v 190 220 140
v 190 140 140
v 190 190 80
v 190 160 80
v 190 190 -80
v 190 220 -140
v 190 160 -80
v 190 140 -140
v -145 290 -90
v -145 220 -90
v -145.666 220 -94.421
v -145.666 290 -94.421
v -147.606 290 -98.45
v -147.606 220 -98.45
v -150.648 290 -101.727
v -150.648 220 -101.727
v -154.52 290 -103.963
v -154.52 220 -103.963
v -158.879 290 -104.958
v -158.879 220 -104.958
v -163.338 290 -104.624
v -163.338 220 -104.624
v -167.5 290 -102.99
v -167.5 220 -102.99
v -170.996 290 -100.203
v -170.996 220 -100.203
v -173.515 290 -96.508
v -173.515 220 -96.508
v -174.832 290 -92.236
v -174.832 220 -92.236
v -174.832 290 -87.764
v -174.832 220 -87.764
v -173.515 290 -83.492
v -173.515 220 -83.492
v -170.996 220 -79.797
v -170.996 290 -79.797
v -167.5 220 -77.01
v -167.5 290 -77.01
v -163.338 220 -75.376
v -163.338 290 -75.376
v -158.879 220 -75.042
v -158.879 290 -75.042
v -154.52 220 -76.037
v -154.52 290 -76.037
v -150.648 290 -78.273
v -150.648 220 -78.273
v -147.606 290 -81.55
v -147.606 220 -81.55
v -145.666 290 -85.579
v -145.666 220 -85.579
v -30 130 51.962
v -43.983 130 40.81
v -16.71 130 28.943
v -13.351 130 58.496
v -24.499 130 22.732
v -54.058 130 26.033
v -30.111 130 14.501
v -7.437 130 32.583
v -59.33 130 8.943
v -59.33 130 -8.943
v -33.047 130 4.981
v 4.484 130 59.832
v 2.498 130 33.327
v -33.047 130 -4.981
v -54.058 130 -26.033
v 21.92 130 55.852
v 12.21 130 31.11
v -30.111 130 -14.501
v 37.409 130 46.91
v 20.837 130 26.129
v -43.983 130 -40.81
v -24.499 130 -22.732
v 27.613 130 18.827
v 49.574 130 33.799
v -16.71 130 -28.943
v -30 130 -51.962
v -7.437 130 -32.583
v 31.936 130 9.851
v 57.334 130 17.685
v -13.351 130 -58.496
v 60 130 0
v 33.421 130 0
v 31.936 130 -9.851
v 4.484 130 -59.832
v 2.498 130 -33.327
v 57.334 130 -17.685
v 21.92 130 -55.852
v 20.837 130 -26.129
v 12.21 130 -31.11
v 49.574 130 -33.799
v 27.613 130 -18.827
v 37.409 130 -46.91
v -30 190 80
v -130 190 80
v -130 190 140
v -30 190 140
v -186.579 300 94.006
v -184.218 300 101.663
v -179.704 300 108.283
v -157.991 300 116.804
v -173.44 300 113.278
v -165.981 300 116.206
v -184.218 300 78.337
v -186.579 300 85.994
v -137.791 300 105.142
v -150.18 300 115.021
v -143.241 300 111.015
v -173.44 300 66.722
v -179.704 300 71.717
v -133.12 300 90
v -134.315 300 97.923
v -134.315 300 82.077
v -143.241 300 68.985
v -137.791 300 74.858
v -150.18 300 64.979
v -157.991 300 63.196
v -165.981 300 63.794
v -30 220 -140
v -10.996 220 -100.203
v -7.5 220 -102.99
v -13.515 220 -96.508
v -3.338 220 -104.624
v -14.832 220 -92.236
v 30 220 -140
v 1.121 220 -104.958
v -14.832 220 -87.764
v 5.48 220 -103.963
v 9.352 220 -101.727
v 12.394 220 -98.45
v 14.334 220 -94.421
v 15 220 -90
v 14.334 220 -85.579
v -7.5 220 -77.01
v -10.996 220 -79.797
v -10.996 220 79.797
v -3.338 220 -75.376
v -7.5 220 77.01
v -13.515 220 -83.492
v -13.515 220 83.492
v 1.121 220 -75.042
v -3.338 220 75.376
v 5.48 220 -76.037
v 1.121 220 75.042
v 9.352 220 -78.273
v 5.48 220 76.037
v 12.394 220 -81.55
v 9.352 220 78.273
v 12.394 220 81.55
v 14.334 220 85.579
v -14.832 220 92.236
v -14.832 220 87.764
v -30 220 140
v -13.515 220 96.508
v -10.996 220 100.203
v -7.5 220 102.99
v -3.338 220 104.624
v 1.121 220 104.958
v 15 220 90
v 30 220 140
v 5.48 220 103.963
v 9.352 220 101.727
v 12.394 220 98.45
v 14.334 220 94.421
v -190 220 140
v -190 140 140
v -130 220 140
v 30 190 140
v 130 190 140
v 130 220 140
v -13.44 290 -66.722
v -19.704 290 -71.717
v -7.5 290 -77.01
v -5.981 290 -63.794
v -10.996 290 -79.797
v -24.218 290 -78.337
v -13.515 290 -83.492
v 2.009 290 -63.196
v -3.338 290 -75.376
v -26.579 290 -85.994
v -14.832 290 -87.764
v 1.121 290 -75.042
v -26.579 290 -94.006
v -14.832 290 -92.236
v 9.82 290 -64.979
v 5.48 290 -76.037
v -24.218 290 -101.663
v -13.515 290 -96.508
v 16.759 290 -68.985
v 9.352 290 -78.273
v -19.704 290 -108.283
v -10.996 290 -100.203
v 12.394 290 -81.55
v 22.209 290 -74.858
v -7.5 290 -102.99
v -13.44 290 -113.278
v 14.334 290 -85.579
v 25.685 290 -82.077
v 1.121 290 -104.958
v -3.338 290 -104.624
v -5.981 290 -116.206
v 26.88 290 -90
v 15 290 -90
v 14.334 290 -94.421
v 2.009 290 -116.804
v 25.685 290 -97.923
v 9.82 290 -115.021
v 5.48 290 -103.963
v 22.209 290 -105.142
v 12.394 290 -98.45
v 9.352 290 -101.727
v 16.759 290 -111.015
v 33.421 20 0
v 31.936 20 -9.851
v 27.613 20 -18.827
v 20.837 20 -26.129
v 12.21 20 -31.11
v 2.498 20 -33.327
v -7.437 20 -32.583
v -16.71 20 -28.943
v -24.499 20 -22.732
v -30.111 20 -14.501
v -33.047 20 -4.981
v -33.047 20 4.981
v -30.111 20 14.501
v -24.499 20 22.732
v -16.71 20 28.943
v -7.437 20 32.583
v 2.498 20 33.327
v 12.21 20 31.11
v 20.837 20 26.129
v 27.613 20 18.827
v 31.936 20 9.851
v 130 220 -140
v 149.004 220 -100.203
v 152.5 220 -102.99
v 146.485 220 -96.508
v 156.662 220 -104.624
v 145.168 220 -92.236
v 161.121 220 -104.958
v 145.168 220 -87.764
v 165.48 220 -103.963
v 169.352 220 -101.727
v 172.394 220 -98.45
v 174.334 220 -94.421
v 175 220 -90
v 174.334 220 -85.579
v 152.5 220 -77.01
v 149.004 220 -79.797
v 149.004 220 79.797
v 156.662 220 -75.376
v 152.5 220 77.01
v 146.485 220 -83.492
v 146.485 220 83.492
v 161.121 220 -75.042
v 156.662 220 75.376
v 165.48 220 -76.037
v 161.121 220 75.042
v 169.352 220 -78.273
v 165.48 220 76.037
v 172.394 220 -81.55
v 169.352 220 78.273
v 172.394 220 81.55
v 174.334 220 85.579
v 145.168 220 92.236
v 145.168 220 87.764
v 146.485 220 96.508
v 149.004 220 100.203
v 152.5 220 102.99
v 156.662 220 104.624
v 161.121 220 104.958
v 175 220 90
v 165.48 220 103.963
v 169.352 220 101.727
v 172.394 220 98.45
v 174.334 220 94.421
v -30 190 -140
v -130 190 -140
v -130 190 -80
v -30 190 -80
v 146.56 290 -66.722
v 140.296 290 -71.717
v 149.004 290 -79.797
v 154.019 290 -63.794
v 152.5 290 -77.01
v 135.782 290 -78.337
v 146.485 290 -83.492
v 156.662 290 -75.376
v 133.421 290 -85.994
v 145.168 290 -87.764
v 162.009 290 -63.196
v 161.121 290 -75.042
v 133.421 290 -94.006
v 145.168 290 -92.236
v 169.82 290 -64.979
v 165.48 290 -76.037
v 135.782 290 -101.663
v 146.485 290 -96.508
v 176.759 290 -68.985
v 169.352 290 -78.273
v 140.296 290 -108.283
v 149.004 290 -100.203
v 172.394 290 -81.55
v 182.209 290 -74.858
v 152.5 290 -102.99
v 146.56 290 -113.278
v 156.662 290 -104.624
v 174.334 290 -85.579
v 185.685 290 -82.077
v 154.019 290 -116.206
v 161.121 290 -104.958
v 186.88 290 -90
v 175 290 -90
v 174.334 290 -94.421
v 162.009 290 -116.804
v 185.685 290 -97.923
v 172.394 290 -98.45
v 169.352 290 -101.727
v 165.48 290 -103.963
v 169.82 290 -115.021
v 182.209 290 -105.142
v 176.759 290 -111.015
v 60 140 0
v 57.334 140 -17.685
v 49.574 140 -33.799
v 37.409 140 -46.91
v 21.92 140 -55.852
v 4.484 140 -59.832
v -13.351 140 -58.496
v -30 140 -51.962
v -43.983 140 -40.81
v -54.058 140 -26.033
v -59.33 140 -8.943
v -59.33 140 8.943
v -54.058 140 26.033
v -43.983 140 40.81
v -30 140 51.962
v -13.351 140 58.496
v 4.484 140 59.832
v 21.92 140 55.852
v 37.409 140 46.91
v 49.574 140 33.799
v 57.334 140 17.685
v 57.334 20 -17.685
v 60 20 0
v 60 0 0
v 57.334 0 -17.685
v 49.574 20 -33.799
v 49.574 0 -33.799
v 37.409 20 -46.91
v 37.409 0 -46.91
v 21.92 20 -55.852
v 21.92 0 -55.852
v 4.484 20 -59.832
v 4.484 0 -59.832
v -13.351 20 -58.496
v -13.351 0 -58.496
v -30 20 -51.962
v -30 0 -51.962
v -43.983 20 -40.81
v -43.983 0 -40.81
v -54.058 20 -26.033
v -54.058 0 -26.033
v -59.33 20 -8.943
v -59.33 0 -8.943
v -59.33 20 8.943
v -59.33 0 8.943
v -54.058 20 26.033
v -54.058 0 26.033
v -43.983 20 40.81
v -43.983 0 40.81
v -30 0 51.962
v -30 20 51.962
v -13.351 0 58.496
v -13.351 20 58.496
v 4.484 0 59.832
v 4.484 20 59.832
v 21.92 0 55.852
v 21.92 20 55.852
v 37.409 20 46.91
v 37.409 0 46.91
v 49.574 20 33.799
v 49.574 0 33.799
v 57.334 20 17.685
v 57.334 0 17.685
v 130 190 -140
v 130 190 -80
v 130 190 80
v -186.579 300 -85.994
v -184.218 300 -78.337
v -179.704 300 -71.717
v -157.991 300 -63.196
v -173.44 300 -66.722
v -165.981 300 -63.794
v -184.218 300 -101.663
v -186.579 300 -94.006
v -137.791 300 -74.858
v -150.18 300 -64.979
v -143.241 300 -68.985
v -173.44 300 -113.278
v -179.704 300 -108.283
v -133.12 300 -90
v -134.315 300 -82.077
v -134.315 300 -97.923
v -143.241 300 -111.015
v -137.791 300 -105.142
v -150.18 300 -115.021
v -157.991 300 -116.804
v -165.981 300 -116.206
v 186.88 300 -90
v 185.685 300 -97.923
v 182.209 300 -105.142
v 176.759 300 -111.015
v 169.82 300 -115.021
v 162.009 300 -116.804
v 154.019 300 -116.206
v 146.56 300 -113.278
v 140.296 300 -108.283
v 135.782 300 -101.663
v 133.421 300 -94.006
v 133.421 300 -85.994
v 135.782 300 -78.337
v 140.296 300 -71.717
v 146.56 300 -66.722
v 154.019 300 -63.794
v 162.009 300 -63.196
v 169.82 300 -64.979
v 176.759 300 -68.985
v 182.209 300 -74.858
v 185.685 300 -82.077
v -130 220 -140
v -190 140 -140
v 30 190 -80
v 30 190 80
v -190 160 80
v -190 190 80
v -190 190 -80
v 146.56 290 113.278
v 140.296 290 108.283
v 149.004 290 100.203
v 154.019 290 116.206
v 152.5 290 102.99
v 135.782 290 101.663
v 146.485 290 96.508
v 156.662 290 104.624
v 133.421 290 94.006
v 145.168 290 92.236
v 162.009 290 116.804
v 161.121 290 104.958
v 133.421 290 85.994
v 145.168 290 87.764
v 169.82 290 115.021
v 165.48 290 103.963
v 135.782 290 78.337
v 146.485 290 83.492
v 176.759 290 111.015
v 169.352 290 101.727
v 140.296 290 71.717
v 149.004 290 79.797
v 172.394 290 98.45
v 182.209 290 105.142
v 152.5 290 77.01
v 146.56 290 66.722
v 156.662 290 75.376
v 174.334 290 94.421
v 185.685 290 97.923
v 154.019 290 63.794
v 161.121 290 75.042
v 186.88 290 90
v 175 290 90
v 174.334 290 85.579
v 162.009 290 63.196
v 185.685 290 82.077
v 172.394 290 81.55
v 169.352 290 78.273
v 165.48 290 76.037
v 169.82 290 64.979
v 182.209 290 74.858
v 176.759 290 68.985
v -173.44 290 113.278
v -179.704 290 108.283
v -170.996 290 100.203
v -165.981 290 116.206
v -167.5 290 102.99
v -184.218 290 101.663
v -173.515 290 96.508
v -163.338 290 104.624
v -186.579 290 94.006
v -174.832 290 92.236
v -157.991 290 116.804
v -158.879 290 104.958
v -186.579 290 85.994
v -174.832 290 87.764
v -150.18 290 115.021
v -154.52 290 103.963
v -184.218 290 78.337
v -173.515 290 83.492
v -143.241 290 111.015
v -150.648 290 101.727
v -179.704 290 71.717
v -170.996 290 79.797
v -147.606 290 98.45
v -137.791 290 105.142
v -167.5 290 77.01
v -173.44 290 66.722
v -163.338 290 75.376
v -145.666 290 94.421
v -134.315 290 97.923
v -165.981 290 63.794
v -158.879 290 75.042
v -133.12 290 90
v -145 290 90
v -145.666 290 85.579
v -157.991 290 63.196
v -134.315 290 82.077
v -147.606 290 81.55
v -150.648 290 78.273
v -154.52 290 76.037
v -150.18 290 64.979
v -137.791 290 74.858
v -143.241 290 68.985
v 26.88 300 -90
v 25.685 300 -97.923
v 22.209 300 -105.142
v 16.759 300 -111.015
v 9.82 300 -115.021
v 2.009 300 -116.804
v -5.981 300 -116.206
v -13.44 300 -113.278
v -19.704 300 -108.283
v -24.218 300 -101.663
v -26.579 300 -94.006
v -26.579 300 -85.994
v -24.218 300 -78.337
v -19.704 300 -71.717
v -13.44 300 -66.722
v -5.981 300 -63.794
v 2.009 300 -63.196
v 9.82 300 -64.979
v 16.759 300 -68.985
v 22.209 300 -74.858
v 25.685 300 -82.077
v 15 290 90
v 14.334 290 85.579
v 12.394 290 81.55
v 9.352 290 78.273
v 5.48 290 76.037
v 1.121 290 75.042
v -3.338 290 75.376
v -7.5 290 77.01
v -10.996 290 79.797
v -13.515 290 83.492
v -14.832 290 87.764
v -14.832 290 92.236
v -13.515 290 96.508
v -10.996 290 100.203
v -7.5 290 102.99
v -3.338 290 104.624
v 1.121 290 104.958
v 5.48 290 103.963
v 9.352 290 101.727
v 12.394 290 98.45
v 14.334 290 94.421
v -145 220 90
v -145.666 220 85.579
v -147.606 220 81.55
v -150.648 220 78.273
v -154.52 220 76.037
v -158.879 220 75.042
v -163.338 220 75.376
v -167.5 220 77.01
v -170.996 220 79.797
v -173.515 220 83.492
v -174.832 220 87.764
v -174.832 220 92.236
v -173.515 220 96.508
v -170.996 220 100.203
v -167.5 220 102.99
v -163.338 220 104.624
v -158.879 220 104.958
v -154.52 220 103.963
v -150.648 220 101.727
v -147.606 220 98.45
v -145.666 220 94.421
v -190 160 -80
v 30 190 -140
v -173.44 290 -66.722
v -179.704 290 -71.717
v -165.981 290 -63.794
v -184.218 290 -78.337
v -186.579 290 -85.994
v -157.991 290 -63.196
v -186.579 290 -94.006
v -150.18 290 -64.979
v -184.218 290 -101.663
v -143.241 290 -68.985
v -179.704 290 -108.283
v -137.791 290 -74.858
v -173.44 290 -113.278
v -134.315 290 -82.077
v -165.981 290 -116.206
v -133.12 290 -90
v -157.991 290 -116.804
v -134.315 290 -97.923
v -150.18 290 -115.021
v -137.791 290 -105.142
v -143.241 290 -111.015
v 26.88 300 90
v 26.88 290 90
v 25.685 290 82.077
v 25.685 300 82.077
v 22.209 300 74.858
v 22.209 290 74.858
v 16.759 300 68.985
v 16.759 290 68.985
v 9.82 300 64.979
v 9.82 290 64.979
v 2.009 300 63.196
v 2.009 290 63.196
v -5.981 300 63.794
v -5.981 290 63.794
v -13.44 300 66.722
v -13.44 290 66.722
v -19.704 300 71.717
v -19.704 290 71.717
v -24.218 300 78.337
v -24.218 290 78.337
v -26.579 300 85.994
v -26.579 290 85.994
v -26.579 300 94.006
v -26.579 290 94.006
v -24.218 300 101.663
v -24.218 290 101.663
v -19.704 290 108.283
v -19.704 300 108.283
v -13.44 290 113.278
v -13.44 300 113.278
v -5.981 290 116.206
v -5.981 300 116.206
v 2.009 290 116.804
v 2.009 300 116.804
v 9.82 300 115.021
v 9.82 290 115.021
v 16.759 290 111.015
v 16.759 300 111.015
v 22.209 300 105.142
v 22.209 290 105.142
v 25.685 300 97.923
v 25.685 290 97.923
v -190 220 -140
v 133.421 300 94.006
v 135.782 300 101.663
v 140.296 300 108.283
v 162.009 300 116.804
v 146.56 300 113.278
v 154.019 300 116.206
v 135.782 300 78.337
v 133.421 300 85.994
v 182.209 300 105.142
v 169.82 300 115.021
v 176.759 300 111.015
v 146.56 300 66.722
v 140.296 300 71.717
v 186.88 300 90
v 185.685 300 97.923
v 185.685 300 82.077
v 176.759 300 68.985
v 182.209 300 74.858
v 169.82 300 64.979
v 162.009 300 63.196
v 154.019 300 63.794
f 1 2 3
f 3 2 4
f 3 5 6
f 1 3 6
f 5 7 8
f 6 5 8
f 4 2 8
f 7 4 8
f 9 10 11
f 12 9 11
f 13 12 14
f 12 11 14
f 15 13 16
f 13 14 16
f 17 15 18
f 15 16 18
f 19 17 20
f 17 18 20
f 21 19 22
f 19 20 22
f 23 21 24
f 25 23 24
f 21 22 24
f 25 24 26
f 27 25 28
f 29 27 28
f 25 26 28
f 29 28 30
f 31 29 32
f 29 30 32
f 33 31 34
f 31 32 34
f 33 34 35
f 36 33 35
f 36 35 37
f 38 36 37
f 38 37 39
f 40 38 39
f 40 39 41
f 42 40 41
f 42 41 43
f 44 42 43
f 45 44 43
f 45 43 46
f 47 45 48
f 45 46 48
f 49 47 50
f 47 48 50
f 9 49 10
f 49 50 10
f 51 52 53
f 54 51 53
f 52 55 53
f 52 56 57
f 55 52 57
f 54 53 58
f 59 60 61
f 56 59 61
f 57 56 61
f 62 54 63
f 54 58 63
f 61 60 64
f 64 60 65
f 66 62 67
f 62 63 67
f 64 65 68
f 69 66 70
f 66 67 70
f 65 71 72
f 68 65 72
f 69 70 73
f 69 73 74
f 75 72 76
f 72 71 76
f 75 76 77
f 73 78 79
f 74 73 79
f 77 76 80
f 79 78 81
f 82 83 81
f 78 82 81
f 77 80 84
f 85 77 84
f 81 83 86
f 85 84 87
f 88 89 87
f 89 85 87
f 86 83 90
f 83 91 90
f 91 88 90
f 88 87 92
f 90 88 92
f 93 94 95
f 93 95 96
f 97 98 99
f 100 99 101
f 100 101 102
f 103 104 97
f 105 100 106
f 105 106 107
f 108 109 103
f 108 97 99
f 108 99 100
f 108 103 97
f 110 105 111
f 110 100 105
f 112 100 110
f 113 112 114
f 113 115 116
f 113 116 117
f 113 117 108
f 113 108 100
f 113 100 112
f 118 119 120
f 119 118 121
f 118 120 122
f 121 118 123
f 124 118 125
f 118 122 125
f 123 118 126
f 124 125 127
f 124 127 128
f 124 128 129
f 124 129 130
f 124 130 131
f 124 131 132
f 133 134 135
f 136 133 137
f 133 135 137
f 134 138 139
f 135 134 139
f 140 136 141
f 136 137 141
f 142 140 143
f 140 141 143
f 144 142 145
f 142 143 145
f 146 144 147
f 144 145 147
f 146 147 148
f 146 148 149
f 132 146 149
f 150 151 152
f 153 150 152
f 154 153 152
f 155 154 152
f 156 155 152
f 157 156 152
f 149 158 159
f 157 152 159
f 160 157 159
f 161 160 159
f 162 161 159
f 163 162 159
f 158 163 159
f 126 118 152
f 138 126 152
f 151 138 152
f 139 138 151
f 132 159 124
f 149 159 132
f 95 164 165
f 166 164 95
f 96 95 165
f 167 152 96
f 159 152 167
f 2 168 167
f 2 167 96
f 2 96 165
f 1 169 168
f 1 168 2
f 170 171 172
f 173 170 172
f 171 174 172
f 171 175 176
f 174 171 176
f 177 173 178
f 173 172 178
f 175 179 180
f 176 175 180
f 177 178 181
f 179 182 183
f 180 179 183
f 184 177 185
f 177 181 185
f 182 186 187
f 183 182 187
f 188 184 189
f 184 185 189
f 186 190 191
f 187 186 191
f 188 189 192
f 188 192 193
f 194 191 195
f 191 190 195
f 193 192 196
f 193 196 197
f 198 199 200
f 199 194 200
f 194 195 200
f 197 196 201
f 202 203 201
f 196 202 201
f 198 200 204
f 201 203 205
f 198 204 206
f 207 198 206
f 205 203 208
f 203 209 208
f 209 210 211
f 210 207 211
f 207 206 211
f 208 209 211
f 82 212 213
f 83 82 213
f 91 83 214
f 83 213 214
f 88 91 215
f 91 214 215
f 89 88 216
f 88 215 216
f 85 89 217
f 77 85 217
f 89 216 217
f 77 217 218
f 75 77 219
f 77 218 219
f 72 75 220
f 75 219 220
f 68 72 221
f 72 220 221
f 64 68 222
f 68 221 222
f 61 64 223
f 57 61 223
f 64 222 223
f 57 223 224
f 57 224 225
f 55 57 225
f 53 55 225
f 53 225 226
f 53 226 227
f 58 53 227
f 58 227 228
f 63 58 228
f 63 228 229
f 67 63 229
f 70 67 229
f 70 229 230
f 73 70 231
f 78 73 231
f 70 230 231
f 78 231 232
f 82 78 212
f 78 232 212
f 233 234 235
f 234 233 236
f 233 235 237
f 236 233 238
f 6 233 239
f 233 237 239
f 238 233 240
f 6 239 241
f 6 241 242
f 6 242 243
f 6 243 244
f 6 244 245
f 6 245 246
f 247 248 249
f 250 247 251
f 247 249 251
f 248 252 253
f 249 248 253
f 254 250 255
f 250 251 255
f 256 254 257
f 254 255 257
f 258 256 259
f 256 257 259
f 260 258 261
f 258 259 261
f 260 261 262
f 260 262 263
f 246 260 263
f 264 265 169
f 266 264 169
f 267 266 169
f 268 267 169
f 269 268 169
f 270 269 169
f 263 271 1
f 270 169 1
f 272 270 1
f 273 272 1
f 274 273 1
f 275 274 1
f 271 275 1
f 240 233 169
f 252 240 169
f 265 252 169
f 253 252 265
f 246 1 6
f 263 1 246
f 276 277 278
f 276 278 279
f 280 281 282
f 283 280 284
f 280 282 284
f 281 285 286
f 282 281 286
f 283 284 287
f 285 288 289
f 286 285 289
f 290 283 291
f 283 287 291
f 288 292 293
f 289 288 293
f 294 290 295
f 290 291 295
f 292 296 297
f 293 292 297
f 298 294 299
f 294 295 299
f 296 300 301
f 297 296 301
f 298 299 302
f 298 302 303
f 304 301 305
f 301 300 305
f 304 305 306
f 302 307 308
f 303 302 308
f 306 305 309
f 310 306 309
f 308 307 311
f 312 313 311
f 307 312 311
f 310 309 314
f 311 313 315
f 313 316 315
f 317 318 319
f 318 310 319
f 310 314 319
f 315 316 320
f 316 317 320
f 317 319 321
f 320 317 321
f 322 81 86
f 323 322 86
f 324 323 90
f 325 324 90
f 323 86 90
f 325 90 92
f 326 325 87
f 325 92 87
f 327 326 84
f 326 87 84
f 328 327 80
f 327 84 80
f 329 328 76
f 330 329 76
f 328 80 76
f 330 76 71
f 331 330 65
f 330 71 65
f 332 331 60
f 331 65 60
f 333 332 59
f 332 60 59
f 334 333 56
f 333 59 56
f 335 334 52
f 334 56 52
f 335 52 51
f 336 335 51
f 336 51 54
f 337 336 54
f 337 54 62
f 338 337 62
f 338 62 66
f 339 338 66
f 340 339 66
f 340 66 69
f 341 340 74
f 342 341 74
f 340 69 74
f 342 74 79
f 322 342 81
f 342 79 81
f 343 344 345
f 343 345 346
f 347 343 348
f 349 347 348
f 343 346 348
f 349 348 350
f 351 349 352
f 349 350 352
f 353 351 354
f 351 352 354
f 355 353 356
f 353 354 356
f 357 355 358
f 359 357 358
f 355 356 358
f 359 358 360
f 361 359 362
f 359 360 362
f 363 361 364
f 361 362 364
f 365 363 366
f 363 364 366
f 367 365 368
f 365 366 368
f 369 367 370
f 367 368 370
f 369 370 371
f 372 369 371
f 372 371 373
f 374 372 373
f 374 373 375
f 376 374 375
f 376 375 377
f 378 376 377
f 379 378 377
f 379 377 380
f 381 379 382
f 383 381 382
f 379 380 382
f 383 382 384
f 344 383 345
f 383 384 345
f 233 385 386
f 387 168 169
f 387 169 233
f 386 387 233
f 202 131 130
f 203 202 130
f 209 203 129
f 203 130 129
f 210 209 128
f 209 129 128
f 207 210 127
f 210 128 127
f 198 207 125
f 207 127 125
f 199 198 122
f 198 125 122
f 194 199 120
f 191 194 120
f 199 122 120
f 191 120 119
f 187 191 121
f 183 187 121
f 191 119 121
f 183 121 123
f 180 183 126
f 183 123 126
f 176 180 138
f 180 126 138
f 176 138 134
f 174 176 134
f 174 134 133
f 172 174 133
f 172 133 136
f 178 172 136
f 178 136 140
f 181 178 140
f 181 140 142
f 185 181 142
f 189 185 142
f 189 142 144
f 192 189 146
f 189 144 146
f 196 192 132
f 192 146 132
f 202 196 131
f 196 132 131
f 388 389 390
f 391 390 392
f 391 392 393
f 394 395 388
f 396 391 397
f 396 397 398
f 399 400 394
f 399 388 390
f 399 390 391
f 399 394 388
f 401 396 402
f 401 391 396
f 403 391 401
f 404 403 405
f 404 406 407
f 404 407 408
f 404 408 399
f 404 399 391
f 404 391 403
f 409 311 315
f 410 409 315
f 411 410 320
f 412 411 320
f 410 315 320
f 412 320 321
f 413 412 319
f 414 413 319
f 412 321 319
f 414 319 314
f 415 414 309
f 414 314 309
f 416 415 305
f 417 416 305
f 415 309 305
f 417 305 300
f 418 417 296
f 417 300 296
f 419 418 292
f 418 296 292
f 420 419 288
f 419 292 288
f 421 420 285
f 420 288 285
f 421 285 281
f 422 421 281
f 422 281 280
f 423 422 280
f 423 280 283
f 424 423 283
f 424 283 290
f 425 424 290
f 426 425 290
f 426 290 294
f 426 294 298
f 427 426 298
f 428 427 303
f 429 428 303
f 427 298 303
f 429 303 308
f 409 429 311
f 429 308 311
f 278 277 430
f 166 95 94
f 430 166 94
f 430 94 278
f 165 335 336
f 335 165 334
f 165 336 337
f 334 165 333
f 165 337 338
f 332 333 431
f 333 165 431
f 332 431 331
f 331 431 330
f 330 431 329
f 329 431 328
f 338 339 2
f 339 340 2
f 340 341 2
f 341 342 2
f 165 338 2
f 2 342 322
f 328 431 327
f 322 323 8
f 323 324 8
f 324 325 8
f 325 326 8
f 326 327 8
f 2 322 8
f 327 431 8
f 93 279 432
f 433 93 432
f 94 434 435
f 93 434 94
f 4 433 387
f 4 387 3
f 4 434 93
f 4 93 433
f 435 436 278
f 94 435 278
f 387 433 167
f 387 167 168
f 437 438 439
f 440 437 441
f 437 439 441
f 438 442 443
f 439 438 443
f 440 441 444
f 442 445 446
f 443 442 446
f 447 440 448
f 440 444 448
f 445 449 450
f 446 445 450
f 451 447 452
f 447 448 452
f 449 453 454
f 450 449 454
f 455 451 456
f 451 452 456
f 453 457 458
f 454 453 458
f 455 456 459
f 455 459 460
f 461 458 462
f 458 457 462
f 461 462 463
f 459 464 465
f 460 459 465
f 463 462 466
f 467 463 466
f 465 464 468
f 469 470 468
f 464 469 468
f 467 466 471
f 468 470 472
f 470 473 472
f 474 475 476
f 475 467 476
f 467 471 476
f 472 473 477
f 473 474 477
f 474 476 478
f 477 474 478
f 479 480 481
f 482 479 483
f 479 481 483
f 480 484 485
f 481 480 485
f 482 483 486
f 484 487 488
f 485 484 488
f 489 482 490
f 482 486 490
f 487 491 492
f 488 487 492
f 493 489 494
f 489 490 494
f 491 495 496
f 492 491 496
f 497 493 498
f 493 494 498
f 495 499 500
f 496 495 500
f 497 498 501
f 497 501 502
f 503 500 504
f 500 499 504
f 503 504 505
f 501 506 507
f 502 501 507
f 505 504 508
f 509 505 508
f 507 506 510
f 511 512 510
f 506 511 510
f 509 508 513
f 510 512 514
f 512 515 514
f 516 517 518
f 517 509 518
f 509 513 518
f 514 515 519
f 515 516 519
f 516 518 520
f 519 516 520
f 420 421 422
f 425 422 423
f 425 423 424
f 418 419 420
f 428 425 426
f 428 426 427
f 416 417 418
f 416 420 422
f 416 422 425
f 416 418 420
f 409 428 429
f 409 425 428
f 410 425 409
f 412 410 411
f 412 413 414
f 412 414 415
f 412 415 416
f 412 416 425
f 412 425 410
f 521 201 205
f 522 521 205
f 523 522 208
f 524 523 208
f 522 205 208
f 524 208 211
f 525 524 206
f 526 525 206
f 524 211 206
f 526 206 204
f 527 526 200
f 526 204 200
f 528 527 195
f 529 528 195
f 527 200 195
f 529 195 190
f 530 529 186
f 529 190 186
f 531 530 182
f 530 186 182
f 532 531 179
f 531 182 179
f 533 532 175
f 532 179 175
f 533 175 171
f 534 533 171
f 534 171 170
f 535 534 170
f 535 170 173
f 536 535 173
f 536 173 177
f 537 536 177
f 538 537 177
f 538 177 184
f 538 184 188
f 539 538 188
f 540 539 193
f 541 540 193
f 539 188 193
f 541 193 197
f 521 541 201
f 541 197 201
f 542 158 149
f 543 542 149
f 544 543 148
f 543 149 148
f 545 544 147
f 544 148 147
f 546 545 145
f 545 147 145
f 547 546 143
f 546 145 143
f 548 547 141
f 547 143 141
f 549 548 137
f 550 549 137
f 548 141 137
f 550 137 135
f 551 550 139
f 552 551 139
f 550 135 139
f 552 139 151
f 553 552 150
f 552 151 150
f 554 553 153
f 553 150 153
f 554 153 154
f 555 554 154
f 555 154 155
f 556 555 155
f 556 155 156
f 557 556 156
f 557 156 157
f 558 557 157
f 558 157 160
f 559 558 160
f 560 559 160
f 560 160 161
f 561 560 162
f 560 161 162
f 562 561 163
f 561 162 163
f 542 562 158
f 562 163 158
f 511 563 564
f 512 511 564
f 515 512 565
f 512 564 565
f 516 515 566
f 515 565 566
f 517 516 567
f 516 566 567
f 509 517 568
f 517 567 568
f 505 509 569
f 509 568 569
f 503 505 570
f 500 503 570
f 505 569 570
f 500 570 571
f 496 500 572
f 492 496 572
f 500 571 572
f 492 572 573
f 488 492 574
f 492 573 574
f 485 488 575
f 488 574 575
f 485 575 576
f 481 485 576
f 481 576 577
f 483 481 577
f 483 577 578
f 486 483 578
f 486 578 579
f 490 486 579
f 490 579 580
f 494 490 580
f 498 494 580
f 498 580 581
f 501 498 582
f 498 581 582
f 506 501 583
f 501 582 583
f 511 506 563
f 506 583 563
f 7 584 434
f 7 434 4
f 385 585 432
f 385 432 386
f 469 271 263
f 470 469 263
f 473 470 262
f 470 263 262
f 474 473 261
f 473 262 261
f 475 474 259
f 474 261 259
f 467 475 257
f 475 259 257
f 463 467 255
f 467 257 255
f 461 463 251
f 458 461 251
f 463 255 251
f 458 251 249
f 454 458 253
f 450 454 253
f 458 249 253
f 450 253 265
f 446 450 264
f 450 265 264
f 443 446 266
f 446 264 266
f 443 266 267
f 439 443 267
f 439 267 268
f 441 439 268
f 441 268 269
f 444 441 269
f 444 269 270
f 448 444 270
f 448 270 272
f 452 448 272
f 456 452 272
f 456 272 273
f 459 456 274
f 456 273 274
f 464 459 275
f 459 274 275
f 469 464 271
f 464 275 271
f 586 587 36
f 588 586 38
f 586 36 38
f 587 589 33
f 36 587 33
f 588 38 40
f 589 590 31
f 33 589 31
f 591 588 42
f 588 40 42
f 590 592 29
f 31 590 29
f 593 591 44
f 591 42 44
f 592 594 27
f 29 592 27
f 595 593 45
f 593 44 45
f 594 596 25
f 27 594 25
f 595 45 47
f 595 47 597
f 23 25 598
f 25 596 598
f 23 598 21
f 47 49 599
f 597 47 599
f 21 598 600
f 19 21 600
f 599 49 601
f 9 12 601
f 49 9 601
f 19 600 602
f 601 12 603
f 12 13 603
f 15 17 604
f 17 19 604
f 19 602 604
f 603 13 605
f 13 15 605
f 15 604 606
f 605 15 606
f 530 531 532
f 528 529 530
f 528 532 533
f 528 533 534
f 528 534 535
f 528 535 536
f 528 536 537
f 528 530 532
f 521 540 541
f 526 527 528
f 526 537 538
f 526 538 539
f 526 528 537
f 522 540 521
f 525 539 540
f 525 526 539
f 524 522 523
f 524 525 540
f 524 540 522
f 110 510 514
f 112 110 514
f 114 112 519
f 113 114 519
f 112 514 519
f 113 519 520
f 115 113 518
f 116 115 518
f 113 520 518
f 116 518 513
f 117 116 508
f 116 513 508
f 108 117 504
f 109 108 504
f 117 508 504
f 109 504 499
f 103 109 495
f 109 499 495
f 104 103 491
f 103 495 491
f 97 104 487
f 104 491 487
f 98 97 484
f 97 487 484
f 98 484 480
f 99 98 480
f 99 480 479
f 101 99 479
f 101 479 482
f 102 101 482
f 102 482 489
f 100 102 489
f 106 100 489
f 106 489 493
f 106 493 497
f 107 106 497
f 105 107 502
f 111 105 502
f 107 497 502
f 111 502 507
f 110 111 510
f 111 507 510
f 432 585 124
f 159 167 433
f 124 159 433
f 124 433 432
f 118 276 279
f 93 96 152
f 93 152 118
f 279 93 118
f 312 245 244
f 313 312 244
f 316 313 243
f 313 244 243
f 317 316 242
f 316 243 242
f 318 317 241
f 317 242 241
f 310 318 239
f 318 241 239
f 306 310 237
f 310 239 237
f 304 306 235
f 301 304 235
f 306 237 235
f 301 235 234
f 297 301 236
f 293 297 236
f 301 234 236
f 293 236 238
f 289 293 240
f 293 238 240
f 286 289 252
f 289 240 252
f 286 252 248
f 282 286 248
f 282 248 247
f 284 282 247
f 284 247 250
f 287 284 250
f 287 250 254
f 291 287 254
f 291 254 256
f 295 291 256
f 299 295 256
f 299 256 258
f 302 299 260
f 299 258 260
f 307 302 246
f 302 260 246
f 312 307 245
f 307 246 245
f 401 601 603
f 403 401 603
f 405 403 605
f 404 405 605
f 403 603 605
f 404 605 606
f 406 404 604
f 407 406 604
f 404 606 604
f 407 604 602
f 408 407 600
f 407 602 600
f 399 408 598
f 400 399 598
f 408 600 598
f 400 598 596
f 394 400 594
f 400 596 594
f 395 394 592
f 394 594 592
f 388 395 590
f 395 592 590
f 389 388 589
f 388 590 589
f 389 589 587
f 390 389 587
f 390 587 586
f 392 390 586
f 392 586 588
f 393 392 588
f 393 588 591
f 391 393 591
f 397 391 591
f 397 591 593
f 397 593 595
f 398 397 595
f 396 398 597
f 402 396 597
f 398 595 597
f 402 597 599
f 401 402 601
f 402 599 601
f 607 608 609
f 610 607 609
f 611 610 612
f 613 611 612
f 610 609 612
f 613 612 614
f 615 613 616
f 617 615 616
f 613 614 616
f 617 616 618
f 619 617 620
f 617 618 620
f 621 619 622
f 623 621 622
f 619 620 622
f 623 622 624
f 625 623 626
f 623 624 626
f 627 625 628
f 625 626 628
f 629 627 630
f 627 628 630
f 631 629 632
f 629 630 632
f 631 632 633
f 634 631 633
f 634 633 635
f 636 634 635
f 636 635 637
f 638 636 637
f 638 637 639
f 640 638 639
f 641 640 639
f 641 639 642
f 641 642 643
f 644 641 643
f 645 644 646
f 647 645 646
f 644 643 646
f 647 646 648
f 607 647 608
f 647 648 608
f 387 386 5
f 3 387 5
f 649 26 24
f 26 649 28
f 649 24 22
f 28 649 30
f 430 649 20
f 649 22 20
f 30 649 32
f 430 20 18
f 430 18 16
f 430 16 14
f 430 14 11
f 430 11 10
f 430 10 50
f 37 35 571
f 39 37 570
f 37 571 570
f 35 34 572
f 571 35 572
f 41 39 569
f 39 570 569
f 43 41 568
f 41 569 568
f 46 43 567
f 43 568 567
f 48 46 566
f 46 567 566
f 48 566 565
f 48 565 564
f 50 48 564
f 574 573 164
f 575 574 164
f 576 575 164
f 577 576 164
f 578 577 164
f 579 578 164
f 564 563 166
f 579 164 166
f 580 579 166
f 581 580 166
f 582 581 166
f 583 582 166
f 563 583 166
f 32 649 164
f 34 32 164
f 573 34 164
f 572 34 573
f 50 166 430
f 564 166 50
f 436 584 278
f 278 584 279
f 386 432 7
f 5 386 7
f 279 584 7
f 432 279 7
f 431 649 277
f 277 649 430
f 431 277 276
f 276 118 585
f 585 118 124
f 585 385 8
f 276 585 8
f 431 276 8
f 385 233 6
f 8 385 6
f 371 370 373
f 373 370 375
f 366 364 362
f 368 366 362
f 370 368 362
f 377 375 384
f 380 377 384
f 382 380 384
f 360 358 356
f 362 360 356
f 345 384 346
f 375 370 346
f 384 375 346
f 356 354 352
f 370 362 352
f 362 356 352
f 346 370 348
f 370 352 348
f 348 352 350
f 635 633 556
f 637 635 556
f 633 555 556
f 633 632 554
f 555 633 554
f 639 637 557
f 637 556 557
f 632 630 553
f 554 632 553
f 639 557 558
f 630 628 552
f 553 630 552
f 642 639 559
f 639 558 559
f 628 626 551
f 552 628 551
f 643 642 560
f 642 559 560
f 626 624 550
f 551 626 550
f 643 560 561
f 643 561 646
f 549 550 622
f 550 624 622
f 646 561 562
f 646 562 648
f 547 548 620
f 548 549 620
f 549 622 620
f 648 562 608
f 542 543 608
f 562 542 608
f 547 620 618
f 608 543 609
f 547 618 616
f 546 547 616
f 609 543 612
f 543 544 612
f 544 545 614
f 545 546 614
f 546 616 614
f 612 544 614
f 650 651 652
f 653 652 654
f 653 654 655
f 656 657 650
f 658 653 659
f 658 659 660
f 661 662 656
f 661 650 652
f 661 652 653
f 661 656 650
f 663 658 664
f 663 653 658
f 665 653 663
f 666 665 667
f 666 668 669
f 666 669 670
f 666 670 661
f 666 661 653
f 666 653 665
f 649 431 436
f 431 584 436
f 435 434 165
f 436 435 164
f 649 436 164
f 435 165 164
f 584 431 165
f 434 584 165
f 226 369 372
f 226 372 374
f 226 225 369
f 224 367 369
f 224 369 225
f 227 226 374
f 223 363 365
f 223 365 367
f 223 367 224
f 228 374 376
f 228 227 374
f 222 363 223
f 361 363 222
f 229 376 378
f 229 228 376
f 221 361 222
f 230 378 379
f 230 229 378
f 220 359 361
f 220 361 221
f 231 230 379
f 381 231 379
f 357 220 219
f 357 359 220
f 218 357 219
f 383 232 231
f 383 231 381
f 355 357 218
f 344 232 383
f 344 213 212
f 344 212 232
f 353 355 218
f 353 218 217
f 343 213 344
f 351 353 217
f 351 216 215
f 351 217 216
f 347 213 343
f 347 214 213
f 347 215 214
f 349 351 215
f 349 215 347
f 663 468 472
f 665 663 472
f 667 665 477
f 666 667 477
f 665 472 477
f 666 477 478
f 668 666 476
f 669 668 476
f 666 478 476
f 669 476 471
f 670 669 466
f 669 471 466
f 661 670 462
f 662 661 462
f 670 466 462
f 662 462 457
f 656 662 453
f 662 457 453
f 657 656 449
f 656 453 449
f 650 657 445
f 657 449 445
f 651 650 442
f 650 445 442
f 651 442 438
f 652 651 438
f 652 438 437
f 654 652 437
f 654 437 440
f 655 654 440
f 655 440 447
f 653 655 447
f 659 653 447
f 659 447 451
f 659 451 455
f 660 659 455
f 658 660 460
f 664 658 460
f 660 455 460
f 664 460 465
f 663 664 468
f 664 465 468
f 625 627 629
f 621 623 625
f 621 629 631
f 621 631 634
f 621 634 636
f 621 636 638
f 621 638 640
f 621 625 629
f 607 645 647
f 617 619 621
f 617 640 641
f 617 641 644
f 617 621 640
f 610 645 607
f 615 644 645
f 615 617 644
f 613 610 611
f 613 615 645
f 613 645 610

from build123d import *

# Parameters (mm, degrees)
SKETCH_3_R      = 60
EXTRUDE_1_DEPTH = 20
SKETCH_4_R      = 33.420656991
EXTRUDE_2_DEPTH = 110
SKETCH_7_R      = 60
EXTRUDE_4_DEPTH = 10
SKETCH_9_W      = 380
SKETCH_9_H      = 280
EXTRUDE_5_DEPTH = 20
SKETCH_11_W     = 380
SKETCH_11_H     = 60
EXTRUDE_6_DEPTH = 30
SKETCH_13_W     = 60
SKETCH_13_H     = 30
EXTRUDE_7_DEPTH = 280
SKETCH_14_R     = 15
EXTRUDE_8_DEPTH = 70
SKETCH_16_R     = 26.879561929
EXTRUDE_9_DEPTH = 10


with BuildPart() as part:
    # 草图3 → 凸台-拉伸1 (new body)
    with BuildSketch(Plane(origin=(0, 0, 0), x_dir=(1, 0, 0), z_dir=(0, 1, 0))):
        Circle(SKETCH_3_R)
    extrude(amount=EXTRUDE_1_DEPTH)

    # 草图4 → 凸台-拉伸2 (add)
    with BuildSketch(Plane(origin=(0, 20, 0), x_dir=(1, 0, 0), z_dir=(0, 1, 0))):
        Circle(SKETCH_4_R)
    extrude(amount=EXTRUDE_2_DEPTH)

    # 草图7 → 凸台-拉伸4 (add)
    with BuildSketch(Plane(origin=(0, 130, 0), x_dir=(1, 0, 0), z_dir=(0, 1, 0))):
        Circle(SKETCH_7_R)
    extrude(amount=EXTRUDE_4_DEPTH)

    # 草图9 → 凸台-拉伸5 (add)
    with BuildSketch(Plane(origin=(0, 140, 0), x_dir=(1, 0, 0), z_dir=(0, 1, 0))):
        Rectangle(SKETCH_9_W, SKETCH_9_H)
    extrude(amount=EXTRUDE_5_DEPTH)

    # 草图11 → 凸台-拉伸6 (add)
    with BuildSketch(Plane(origin=(0, 160, 0), x_dir=(1, 0, 0), z_dir=(0, 1, 0))):
        with Locations((0, 110)):
            Rectangle(SKETCH_11_W, SKETCH_11_H)
        with Locations((0, -110)):
            Rectangle(SKETCH_11_W, SKETCH_11_H)
    extrude(amount=EXTRUDE_6_DEPTH)

    # 草图13 → 凸台-拉伸7 (add)
    with BuildSketch(Plane.XY.offset(140)):
        with Locations((-160, 205)):
            Rectangle(SKETCH_13_W, SKETCH_13_H)
        with Locations((0, 205)):
            Rectangle(SKETCH_13_W, SKETCH_13_H)
        with Locations((160, 205)):
            Rectangle(SKETCH_13_W, SKETCH_13_H)
    extrude(amount=-EXTRUDE_7_DEPTH)

    # 草图14 → 凸台-拉伸8 (add)
    with BuildSketch(Plane(origin=(0, 220, 0), x_dir=(1, 0, 0), z_dir=(0, 1, 0))):
        with Locations((-160, 90)):
            Circle(SKETCH_14_R)
        with Locations((0, 90)):
            Circle(SKETCH_14_R)
        with Locations((160, 90)):
            Circle(SKETCH_14_R)
        with Locations((-160, -90)):
            Circle(SKETCH_14_R)
        with Locations((0, -90)):
            Circle(SKETCH_14_R)
        with Locations((160, -90)):
            Circle(SKETCH_14_R)
    extrude(amount=EXTRUDE_8_DEPTH)

    # 草图16 → 凸台-拉伸9 (add)
    with BuildSketch(Plane(origin=(0, 290, 0), x_dir=(1, 0, 0), z_dir=(0, 1, 0))):
        with Locations((-160, 90)):
            Circle(SKETCH_16_R)
        with Locations((0, 90)):
            Circle(SKETCH_16_R)
        with Locations((160, 90)):
            Circle(SKETCH_16_R)
        with Locations((-160, -90)):
            Circle(SKETCH_16_R)
        with Locations((0, -90)):
            Circle(SKETCH_16_R)
        with Locations((160, -90)):
            Circle(SKETCH_16_R)
    extrude(amount=EXTRUDE_9_DEPTH)


solid = part.part
